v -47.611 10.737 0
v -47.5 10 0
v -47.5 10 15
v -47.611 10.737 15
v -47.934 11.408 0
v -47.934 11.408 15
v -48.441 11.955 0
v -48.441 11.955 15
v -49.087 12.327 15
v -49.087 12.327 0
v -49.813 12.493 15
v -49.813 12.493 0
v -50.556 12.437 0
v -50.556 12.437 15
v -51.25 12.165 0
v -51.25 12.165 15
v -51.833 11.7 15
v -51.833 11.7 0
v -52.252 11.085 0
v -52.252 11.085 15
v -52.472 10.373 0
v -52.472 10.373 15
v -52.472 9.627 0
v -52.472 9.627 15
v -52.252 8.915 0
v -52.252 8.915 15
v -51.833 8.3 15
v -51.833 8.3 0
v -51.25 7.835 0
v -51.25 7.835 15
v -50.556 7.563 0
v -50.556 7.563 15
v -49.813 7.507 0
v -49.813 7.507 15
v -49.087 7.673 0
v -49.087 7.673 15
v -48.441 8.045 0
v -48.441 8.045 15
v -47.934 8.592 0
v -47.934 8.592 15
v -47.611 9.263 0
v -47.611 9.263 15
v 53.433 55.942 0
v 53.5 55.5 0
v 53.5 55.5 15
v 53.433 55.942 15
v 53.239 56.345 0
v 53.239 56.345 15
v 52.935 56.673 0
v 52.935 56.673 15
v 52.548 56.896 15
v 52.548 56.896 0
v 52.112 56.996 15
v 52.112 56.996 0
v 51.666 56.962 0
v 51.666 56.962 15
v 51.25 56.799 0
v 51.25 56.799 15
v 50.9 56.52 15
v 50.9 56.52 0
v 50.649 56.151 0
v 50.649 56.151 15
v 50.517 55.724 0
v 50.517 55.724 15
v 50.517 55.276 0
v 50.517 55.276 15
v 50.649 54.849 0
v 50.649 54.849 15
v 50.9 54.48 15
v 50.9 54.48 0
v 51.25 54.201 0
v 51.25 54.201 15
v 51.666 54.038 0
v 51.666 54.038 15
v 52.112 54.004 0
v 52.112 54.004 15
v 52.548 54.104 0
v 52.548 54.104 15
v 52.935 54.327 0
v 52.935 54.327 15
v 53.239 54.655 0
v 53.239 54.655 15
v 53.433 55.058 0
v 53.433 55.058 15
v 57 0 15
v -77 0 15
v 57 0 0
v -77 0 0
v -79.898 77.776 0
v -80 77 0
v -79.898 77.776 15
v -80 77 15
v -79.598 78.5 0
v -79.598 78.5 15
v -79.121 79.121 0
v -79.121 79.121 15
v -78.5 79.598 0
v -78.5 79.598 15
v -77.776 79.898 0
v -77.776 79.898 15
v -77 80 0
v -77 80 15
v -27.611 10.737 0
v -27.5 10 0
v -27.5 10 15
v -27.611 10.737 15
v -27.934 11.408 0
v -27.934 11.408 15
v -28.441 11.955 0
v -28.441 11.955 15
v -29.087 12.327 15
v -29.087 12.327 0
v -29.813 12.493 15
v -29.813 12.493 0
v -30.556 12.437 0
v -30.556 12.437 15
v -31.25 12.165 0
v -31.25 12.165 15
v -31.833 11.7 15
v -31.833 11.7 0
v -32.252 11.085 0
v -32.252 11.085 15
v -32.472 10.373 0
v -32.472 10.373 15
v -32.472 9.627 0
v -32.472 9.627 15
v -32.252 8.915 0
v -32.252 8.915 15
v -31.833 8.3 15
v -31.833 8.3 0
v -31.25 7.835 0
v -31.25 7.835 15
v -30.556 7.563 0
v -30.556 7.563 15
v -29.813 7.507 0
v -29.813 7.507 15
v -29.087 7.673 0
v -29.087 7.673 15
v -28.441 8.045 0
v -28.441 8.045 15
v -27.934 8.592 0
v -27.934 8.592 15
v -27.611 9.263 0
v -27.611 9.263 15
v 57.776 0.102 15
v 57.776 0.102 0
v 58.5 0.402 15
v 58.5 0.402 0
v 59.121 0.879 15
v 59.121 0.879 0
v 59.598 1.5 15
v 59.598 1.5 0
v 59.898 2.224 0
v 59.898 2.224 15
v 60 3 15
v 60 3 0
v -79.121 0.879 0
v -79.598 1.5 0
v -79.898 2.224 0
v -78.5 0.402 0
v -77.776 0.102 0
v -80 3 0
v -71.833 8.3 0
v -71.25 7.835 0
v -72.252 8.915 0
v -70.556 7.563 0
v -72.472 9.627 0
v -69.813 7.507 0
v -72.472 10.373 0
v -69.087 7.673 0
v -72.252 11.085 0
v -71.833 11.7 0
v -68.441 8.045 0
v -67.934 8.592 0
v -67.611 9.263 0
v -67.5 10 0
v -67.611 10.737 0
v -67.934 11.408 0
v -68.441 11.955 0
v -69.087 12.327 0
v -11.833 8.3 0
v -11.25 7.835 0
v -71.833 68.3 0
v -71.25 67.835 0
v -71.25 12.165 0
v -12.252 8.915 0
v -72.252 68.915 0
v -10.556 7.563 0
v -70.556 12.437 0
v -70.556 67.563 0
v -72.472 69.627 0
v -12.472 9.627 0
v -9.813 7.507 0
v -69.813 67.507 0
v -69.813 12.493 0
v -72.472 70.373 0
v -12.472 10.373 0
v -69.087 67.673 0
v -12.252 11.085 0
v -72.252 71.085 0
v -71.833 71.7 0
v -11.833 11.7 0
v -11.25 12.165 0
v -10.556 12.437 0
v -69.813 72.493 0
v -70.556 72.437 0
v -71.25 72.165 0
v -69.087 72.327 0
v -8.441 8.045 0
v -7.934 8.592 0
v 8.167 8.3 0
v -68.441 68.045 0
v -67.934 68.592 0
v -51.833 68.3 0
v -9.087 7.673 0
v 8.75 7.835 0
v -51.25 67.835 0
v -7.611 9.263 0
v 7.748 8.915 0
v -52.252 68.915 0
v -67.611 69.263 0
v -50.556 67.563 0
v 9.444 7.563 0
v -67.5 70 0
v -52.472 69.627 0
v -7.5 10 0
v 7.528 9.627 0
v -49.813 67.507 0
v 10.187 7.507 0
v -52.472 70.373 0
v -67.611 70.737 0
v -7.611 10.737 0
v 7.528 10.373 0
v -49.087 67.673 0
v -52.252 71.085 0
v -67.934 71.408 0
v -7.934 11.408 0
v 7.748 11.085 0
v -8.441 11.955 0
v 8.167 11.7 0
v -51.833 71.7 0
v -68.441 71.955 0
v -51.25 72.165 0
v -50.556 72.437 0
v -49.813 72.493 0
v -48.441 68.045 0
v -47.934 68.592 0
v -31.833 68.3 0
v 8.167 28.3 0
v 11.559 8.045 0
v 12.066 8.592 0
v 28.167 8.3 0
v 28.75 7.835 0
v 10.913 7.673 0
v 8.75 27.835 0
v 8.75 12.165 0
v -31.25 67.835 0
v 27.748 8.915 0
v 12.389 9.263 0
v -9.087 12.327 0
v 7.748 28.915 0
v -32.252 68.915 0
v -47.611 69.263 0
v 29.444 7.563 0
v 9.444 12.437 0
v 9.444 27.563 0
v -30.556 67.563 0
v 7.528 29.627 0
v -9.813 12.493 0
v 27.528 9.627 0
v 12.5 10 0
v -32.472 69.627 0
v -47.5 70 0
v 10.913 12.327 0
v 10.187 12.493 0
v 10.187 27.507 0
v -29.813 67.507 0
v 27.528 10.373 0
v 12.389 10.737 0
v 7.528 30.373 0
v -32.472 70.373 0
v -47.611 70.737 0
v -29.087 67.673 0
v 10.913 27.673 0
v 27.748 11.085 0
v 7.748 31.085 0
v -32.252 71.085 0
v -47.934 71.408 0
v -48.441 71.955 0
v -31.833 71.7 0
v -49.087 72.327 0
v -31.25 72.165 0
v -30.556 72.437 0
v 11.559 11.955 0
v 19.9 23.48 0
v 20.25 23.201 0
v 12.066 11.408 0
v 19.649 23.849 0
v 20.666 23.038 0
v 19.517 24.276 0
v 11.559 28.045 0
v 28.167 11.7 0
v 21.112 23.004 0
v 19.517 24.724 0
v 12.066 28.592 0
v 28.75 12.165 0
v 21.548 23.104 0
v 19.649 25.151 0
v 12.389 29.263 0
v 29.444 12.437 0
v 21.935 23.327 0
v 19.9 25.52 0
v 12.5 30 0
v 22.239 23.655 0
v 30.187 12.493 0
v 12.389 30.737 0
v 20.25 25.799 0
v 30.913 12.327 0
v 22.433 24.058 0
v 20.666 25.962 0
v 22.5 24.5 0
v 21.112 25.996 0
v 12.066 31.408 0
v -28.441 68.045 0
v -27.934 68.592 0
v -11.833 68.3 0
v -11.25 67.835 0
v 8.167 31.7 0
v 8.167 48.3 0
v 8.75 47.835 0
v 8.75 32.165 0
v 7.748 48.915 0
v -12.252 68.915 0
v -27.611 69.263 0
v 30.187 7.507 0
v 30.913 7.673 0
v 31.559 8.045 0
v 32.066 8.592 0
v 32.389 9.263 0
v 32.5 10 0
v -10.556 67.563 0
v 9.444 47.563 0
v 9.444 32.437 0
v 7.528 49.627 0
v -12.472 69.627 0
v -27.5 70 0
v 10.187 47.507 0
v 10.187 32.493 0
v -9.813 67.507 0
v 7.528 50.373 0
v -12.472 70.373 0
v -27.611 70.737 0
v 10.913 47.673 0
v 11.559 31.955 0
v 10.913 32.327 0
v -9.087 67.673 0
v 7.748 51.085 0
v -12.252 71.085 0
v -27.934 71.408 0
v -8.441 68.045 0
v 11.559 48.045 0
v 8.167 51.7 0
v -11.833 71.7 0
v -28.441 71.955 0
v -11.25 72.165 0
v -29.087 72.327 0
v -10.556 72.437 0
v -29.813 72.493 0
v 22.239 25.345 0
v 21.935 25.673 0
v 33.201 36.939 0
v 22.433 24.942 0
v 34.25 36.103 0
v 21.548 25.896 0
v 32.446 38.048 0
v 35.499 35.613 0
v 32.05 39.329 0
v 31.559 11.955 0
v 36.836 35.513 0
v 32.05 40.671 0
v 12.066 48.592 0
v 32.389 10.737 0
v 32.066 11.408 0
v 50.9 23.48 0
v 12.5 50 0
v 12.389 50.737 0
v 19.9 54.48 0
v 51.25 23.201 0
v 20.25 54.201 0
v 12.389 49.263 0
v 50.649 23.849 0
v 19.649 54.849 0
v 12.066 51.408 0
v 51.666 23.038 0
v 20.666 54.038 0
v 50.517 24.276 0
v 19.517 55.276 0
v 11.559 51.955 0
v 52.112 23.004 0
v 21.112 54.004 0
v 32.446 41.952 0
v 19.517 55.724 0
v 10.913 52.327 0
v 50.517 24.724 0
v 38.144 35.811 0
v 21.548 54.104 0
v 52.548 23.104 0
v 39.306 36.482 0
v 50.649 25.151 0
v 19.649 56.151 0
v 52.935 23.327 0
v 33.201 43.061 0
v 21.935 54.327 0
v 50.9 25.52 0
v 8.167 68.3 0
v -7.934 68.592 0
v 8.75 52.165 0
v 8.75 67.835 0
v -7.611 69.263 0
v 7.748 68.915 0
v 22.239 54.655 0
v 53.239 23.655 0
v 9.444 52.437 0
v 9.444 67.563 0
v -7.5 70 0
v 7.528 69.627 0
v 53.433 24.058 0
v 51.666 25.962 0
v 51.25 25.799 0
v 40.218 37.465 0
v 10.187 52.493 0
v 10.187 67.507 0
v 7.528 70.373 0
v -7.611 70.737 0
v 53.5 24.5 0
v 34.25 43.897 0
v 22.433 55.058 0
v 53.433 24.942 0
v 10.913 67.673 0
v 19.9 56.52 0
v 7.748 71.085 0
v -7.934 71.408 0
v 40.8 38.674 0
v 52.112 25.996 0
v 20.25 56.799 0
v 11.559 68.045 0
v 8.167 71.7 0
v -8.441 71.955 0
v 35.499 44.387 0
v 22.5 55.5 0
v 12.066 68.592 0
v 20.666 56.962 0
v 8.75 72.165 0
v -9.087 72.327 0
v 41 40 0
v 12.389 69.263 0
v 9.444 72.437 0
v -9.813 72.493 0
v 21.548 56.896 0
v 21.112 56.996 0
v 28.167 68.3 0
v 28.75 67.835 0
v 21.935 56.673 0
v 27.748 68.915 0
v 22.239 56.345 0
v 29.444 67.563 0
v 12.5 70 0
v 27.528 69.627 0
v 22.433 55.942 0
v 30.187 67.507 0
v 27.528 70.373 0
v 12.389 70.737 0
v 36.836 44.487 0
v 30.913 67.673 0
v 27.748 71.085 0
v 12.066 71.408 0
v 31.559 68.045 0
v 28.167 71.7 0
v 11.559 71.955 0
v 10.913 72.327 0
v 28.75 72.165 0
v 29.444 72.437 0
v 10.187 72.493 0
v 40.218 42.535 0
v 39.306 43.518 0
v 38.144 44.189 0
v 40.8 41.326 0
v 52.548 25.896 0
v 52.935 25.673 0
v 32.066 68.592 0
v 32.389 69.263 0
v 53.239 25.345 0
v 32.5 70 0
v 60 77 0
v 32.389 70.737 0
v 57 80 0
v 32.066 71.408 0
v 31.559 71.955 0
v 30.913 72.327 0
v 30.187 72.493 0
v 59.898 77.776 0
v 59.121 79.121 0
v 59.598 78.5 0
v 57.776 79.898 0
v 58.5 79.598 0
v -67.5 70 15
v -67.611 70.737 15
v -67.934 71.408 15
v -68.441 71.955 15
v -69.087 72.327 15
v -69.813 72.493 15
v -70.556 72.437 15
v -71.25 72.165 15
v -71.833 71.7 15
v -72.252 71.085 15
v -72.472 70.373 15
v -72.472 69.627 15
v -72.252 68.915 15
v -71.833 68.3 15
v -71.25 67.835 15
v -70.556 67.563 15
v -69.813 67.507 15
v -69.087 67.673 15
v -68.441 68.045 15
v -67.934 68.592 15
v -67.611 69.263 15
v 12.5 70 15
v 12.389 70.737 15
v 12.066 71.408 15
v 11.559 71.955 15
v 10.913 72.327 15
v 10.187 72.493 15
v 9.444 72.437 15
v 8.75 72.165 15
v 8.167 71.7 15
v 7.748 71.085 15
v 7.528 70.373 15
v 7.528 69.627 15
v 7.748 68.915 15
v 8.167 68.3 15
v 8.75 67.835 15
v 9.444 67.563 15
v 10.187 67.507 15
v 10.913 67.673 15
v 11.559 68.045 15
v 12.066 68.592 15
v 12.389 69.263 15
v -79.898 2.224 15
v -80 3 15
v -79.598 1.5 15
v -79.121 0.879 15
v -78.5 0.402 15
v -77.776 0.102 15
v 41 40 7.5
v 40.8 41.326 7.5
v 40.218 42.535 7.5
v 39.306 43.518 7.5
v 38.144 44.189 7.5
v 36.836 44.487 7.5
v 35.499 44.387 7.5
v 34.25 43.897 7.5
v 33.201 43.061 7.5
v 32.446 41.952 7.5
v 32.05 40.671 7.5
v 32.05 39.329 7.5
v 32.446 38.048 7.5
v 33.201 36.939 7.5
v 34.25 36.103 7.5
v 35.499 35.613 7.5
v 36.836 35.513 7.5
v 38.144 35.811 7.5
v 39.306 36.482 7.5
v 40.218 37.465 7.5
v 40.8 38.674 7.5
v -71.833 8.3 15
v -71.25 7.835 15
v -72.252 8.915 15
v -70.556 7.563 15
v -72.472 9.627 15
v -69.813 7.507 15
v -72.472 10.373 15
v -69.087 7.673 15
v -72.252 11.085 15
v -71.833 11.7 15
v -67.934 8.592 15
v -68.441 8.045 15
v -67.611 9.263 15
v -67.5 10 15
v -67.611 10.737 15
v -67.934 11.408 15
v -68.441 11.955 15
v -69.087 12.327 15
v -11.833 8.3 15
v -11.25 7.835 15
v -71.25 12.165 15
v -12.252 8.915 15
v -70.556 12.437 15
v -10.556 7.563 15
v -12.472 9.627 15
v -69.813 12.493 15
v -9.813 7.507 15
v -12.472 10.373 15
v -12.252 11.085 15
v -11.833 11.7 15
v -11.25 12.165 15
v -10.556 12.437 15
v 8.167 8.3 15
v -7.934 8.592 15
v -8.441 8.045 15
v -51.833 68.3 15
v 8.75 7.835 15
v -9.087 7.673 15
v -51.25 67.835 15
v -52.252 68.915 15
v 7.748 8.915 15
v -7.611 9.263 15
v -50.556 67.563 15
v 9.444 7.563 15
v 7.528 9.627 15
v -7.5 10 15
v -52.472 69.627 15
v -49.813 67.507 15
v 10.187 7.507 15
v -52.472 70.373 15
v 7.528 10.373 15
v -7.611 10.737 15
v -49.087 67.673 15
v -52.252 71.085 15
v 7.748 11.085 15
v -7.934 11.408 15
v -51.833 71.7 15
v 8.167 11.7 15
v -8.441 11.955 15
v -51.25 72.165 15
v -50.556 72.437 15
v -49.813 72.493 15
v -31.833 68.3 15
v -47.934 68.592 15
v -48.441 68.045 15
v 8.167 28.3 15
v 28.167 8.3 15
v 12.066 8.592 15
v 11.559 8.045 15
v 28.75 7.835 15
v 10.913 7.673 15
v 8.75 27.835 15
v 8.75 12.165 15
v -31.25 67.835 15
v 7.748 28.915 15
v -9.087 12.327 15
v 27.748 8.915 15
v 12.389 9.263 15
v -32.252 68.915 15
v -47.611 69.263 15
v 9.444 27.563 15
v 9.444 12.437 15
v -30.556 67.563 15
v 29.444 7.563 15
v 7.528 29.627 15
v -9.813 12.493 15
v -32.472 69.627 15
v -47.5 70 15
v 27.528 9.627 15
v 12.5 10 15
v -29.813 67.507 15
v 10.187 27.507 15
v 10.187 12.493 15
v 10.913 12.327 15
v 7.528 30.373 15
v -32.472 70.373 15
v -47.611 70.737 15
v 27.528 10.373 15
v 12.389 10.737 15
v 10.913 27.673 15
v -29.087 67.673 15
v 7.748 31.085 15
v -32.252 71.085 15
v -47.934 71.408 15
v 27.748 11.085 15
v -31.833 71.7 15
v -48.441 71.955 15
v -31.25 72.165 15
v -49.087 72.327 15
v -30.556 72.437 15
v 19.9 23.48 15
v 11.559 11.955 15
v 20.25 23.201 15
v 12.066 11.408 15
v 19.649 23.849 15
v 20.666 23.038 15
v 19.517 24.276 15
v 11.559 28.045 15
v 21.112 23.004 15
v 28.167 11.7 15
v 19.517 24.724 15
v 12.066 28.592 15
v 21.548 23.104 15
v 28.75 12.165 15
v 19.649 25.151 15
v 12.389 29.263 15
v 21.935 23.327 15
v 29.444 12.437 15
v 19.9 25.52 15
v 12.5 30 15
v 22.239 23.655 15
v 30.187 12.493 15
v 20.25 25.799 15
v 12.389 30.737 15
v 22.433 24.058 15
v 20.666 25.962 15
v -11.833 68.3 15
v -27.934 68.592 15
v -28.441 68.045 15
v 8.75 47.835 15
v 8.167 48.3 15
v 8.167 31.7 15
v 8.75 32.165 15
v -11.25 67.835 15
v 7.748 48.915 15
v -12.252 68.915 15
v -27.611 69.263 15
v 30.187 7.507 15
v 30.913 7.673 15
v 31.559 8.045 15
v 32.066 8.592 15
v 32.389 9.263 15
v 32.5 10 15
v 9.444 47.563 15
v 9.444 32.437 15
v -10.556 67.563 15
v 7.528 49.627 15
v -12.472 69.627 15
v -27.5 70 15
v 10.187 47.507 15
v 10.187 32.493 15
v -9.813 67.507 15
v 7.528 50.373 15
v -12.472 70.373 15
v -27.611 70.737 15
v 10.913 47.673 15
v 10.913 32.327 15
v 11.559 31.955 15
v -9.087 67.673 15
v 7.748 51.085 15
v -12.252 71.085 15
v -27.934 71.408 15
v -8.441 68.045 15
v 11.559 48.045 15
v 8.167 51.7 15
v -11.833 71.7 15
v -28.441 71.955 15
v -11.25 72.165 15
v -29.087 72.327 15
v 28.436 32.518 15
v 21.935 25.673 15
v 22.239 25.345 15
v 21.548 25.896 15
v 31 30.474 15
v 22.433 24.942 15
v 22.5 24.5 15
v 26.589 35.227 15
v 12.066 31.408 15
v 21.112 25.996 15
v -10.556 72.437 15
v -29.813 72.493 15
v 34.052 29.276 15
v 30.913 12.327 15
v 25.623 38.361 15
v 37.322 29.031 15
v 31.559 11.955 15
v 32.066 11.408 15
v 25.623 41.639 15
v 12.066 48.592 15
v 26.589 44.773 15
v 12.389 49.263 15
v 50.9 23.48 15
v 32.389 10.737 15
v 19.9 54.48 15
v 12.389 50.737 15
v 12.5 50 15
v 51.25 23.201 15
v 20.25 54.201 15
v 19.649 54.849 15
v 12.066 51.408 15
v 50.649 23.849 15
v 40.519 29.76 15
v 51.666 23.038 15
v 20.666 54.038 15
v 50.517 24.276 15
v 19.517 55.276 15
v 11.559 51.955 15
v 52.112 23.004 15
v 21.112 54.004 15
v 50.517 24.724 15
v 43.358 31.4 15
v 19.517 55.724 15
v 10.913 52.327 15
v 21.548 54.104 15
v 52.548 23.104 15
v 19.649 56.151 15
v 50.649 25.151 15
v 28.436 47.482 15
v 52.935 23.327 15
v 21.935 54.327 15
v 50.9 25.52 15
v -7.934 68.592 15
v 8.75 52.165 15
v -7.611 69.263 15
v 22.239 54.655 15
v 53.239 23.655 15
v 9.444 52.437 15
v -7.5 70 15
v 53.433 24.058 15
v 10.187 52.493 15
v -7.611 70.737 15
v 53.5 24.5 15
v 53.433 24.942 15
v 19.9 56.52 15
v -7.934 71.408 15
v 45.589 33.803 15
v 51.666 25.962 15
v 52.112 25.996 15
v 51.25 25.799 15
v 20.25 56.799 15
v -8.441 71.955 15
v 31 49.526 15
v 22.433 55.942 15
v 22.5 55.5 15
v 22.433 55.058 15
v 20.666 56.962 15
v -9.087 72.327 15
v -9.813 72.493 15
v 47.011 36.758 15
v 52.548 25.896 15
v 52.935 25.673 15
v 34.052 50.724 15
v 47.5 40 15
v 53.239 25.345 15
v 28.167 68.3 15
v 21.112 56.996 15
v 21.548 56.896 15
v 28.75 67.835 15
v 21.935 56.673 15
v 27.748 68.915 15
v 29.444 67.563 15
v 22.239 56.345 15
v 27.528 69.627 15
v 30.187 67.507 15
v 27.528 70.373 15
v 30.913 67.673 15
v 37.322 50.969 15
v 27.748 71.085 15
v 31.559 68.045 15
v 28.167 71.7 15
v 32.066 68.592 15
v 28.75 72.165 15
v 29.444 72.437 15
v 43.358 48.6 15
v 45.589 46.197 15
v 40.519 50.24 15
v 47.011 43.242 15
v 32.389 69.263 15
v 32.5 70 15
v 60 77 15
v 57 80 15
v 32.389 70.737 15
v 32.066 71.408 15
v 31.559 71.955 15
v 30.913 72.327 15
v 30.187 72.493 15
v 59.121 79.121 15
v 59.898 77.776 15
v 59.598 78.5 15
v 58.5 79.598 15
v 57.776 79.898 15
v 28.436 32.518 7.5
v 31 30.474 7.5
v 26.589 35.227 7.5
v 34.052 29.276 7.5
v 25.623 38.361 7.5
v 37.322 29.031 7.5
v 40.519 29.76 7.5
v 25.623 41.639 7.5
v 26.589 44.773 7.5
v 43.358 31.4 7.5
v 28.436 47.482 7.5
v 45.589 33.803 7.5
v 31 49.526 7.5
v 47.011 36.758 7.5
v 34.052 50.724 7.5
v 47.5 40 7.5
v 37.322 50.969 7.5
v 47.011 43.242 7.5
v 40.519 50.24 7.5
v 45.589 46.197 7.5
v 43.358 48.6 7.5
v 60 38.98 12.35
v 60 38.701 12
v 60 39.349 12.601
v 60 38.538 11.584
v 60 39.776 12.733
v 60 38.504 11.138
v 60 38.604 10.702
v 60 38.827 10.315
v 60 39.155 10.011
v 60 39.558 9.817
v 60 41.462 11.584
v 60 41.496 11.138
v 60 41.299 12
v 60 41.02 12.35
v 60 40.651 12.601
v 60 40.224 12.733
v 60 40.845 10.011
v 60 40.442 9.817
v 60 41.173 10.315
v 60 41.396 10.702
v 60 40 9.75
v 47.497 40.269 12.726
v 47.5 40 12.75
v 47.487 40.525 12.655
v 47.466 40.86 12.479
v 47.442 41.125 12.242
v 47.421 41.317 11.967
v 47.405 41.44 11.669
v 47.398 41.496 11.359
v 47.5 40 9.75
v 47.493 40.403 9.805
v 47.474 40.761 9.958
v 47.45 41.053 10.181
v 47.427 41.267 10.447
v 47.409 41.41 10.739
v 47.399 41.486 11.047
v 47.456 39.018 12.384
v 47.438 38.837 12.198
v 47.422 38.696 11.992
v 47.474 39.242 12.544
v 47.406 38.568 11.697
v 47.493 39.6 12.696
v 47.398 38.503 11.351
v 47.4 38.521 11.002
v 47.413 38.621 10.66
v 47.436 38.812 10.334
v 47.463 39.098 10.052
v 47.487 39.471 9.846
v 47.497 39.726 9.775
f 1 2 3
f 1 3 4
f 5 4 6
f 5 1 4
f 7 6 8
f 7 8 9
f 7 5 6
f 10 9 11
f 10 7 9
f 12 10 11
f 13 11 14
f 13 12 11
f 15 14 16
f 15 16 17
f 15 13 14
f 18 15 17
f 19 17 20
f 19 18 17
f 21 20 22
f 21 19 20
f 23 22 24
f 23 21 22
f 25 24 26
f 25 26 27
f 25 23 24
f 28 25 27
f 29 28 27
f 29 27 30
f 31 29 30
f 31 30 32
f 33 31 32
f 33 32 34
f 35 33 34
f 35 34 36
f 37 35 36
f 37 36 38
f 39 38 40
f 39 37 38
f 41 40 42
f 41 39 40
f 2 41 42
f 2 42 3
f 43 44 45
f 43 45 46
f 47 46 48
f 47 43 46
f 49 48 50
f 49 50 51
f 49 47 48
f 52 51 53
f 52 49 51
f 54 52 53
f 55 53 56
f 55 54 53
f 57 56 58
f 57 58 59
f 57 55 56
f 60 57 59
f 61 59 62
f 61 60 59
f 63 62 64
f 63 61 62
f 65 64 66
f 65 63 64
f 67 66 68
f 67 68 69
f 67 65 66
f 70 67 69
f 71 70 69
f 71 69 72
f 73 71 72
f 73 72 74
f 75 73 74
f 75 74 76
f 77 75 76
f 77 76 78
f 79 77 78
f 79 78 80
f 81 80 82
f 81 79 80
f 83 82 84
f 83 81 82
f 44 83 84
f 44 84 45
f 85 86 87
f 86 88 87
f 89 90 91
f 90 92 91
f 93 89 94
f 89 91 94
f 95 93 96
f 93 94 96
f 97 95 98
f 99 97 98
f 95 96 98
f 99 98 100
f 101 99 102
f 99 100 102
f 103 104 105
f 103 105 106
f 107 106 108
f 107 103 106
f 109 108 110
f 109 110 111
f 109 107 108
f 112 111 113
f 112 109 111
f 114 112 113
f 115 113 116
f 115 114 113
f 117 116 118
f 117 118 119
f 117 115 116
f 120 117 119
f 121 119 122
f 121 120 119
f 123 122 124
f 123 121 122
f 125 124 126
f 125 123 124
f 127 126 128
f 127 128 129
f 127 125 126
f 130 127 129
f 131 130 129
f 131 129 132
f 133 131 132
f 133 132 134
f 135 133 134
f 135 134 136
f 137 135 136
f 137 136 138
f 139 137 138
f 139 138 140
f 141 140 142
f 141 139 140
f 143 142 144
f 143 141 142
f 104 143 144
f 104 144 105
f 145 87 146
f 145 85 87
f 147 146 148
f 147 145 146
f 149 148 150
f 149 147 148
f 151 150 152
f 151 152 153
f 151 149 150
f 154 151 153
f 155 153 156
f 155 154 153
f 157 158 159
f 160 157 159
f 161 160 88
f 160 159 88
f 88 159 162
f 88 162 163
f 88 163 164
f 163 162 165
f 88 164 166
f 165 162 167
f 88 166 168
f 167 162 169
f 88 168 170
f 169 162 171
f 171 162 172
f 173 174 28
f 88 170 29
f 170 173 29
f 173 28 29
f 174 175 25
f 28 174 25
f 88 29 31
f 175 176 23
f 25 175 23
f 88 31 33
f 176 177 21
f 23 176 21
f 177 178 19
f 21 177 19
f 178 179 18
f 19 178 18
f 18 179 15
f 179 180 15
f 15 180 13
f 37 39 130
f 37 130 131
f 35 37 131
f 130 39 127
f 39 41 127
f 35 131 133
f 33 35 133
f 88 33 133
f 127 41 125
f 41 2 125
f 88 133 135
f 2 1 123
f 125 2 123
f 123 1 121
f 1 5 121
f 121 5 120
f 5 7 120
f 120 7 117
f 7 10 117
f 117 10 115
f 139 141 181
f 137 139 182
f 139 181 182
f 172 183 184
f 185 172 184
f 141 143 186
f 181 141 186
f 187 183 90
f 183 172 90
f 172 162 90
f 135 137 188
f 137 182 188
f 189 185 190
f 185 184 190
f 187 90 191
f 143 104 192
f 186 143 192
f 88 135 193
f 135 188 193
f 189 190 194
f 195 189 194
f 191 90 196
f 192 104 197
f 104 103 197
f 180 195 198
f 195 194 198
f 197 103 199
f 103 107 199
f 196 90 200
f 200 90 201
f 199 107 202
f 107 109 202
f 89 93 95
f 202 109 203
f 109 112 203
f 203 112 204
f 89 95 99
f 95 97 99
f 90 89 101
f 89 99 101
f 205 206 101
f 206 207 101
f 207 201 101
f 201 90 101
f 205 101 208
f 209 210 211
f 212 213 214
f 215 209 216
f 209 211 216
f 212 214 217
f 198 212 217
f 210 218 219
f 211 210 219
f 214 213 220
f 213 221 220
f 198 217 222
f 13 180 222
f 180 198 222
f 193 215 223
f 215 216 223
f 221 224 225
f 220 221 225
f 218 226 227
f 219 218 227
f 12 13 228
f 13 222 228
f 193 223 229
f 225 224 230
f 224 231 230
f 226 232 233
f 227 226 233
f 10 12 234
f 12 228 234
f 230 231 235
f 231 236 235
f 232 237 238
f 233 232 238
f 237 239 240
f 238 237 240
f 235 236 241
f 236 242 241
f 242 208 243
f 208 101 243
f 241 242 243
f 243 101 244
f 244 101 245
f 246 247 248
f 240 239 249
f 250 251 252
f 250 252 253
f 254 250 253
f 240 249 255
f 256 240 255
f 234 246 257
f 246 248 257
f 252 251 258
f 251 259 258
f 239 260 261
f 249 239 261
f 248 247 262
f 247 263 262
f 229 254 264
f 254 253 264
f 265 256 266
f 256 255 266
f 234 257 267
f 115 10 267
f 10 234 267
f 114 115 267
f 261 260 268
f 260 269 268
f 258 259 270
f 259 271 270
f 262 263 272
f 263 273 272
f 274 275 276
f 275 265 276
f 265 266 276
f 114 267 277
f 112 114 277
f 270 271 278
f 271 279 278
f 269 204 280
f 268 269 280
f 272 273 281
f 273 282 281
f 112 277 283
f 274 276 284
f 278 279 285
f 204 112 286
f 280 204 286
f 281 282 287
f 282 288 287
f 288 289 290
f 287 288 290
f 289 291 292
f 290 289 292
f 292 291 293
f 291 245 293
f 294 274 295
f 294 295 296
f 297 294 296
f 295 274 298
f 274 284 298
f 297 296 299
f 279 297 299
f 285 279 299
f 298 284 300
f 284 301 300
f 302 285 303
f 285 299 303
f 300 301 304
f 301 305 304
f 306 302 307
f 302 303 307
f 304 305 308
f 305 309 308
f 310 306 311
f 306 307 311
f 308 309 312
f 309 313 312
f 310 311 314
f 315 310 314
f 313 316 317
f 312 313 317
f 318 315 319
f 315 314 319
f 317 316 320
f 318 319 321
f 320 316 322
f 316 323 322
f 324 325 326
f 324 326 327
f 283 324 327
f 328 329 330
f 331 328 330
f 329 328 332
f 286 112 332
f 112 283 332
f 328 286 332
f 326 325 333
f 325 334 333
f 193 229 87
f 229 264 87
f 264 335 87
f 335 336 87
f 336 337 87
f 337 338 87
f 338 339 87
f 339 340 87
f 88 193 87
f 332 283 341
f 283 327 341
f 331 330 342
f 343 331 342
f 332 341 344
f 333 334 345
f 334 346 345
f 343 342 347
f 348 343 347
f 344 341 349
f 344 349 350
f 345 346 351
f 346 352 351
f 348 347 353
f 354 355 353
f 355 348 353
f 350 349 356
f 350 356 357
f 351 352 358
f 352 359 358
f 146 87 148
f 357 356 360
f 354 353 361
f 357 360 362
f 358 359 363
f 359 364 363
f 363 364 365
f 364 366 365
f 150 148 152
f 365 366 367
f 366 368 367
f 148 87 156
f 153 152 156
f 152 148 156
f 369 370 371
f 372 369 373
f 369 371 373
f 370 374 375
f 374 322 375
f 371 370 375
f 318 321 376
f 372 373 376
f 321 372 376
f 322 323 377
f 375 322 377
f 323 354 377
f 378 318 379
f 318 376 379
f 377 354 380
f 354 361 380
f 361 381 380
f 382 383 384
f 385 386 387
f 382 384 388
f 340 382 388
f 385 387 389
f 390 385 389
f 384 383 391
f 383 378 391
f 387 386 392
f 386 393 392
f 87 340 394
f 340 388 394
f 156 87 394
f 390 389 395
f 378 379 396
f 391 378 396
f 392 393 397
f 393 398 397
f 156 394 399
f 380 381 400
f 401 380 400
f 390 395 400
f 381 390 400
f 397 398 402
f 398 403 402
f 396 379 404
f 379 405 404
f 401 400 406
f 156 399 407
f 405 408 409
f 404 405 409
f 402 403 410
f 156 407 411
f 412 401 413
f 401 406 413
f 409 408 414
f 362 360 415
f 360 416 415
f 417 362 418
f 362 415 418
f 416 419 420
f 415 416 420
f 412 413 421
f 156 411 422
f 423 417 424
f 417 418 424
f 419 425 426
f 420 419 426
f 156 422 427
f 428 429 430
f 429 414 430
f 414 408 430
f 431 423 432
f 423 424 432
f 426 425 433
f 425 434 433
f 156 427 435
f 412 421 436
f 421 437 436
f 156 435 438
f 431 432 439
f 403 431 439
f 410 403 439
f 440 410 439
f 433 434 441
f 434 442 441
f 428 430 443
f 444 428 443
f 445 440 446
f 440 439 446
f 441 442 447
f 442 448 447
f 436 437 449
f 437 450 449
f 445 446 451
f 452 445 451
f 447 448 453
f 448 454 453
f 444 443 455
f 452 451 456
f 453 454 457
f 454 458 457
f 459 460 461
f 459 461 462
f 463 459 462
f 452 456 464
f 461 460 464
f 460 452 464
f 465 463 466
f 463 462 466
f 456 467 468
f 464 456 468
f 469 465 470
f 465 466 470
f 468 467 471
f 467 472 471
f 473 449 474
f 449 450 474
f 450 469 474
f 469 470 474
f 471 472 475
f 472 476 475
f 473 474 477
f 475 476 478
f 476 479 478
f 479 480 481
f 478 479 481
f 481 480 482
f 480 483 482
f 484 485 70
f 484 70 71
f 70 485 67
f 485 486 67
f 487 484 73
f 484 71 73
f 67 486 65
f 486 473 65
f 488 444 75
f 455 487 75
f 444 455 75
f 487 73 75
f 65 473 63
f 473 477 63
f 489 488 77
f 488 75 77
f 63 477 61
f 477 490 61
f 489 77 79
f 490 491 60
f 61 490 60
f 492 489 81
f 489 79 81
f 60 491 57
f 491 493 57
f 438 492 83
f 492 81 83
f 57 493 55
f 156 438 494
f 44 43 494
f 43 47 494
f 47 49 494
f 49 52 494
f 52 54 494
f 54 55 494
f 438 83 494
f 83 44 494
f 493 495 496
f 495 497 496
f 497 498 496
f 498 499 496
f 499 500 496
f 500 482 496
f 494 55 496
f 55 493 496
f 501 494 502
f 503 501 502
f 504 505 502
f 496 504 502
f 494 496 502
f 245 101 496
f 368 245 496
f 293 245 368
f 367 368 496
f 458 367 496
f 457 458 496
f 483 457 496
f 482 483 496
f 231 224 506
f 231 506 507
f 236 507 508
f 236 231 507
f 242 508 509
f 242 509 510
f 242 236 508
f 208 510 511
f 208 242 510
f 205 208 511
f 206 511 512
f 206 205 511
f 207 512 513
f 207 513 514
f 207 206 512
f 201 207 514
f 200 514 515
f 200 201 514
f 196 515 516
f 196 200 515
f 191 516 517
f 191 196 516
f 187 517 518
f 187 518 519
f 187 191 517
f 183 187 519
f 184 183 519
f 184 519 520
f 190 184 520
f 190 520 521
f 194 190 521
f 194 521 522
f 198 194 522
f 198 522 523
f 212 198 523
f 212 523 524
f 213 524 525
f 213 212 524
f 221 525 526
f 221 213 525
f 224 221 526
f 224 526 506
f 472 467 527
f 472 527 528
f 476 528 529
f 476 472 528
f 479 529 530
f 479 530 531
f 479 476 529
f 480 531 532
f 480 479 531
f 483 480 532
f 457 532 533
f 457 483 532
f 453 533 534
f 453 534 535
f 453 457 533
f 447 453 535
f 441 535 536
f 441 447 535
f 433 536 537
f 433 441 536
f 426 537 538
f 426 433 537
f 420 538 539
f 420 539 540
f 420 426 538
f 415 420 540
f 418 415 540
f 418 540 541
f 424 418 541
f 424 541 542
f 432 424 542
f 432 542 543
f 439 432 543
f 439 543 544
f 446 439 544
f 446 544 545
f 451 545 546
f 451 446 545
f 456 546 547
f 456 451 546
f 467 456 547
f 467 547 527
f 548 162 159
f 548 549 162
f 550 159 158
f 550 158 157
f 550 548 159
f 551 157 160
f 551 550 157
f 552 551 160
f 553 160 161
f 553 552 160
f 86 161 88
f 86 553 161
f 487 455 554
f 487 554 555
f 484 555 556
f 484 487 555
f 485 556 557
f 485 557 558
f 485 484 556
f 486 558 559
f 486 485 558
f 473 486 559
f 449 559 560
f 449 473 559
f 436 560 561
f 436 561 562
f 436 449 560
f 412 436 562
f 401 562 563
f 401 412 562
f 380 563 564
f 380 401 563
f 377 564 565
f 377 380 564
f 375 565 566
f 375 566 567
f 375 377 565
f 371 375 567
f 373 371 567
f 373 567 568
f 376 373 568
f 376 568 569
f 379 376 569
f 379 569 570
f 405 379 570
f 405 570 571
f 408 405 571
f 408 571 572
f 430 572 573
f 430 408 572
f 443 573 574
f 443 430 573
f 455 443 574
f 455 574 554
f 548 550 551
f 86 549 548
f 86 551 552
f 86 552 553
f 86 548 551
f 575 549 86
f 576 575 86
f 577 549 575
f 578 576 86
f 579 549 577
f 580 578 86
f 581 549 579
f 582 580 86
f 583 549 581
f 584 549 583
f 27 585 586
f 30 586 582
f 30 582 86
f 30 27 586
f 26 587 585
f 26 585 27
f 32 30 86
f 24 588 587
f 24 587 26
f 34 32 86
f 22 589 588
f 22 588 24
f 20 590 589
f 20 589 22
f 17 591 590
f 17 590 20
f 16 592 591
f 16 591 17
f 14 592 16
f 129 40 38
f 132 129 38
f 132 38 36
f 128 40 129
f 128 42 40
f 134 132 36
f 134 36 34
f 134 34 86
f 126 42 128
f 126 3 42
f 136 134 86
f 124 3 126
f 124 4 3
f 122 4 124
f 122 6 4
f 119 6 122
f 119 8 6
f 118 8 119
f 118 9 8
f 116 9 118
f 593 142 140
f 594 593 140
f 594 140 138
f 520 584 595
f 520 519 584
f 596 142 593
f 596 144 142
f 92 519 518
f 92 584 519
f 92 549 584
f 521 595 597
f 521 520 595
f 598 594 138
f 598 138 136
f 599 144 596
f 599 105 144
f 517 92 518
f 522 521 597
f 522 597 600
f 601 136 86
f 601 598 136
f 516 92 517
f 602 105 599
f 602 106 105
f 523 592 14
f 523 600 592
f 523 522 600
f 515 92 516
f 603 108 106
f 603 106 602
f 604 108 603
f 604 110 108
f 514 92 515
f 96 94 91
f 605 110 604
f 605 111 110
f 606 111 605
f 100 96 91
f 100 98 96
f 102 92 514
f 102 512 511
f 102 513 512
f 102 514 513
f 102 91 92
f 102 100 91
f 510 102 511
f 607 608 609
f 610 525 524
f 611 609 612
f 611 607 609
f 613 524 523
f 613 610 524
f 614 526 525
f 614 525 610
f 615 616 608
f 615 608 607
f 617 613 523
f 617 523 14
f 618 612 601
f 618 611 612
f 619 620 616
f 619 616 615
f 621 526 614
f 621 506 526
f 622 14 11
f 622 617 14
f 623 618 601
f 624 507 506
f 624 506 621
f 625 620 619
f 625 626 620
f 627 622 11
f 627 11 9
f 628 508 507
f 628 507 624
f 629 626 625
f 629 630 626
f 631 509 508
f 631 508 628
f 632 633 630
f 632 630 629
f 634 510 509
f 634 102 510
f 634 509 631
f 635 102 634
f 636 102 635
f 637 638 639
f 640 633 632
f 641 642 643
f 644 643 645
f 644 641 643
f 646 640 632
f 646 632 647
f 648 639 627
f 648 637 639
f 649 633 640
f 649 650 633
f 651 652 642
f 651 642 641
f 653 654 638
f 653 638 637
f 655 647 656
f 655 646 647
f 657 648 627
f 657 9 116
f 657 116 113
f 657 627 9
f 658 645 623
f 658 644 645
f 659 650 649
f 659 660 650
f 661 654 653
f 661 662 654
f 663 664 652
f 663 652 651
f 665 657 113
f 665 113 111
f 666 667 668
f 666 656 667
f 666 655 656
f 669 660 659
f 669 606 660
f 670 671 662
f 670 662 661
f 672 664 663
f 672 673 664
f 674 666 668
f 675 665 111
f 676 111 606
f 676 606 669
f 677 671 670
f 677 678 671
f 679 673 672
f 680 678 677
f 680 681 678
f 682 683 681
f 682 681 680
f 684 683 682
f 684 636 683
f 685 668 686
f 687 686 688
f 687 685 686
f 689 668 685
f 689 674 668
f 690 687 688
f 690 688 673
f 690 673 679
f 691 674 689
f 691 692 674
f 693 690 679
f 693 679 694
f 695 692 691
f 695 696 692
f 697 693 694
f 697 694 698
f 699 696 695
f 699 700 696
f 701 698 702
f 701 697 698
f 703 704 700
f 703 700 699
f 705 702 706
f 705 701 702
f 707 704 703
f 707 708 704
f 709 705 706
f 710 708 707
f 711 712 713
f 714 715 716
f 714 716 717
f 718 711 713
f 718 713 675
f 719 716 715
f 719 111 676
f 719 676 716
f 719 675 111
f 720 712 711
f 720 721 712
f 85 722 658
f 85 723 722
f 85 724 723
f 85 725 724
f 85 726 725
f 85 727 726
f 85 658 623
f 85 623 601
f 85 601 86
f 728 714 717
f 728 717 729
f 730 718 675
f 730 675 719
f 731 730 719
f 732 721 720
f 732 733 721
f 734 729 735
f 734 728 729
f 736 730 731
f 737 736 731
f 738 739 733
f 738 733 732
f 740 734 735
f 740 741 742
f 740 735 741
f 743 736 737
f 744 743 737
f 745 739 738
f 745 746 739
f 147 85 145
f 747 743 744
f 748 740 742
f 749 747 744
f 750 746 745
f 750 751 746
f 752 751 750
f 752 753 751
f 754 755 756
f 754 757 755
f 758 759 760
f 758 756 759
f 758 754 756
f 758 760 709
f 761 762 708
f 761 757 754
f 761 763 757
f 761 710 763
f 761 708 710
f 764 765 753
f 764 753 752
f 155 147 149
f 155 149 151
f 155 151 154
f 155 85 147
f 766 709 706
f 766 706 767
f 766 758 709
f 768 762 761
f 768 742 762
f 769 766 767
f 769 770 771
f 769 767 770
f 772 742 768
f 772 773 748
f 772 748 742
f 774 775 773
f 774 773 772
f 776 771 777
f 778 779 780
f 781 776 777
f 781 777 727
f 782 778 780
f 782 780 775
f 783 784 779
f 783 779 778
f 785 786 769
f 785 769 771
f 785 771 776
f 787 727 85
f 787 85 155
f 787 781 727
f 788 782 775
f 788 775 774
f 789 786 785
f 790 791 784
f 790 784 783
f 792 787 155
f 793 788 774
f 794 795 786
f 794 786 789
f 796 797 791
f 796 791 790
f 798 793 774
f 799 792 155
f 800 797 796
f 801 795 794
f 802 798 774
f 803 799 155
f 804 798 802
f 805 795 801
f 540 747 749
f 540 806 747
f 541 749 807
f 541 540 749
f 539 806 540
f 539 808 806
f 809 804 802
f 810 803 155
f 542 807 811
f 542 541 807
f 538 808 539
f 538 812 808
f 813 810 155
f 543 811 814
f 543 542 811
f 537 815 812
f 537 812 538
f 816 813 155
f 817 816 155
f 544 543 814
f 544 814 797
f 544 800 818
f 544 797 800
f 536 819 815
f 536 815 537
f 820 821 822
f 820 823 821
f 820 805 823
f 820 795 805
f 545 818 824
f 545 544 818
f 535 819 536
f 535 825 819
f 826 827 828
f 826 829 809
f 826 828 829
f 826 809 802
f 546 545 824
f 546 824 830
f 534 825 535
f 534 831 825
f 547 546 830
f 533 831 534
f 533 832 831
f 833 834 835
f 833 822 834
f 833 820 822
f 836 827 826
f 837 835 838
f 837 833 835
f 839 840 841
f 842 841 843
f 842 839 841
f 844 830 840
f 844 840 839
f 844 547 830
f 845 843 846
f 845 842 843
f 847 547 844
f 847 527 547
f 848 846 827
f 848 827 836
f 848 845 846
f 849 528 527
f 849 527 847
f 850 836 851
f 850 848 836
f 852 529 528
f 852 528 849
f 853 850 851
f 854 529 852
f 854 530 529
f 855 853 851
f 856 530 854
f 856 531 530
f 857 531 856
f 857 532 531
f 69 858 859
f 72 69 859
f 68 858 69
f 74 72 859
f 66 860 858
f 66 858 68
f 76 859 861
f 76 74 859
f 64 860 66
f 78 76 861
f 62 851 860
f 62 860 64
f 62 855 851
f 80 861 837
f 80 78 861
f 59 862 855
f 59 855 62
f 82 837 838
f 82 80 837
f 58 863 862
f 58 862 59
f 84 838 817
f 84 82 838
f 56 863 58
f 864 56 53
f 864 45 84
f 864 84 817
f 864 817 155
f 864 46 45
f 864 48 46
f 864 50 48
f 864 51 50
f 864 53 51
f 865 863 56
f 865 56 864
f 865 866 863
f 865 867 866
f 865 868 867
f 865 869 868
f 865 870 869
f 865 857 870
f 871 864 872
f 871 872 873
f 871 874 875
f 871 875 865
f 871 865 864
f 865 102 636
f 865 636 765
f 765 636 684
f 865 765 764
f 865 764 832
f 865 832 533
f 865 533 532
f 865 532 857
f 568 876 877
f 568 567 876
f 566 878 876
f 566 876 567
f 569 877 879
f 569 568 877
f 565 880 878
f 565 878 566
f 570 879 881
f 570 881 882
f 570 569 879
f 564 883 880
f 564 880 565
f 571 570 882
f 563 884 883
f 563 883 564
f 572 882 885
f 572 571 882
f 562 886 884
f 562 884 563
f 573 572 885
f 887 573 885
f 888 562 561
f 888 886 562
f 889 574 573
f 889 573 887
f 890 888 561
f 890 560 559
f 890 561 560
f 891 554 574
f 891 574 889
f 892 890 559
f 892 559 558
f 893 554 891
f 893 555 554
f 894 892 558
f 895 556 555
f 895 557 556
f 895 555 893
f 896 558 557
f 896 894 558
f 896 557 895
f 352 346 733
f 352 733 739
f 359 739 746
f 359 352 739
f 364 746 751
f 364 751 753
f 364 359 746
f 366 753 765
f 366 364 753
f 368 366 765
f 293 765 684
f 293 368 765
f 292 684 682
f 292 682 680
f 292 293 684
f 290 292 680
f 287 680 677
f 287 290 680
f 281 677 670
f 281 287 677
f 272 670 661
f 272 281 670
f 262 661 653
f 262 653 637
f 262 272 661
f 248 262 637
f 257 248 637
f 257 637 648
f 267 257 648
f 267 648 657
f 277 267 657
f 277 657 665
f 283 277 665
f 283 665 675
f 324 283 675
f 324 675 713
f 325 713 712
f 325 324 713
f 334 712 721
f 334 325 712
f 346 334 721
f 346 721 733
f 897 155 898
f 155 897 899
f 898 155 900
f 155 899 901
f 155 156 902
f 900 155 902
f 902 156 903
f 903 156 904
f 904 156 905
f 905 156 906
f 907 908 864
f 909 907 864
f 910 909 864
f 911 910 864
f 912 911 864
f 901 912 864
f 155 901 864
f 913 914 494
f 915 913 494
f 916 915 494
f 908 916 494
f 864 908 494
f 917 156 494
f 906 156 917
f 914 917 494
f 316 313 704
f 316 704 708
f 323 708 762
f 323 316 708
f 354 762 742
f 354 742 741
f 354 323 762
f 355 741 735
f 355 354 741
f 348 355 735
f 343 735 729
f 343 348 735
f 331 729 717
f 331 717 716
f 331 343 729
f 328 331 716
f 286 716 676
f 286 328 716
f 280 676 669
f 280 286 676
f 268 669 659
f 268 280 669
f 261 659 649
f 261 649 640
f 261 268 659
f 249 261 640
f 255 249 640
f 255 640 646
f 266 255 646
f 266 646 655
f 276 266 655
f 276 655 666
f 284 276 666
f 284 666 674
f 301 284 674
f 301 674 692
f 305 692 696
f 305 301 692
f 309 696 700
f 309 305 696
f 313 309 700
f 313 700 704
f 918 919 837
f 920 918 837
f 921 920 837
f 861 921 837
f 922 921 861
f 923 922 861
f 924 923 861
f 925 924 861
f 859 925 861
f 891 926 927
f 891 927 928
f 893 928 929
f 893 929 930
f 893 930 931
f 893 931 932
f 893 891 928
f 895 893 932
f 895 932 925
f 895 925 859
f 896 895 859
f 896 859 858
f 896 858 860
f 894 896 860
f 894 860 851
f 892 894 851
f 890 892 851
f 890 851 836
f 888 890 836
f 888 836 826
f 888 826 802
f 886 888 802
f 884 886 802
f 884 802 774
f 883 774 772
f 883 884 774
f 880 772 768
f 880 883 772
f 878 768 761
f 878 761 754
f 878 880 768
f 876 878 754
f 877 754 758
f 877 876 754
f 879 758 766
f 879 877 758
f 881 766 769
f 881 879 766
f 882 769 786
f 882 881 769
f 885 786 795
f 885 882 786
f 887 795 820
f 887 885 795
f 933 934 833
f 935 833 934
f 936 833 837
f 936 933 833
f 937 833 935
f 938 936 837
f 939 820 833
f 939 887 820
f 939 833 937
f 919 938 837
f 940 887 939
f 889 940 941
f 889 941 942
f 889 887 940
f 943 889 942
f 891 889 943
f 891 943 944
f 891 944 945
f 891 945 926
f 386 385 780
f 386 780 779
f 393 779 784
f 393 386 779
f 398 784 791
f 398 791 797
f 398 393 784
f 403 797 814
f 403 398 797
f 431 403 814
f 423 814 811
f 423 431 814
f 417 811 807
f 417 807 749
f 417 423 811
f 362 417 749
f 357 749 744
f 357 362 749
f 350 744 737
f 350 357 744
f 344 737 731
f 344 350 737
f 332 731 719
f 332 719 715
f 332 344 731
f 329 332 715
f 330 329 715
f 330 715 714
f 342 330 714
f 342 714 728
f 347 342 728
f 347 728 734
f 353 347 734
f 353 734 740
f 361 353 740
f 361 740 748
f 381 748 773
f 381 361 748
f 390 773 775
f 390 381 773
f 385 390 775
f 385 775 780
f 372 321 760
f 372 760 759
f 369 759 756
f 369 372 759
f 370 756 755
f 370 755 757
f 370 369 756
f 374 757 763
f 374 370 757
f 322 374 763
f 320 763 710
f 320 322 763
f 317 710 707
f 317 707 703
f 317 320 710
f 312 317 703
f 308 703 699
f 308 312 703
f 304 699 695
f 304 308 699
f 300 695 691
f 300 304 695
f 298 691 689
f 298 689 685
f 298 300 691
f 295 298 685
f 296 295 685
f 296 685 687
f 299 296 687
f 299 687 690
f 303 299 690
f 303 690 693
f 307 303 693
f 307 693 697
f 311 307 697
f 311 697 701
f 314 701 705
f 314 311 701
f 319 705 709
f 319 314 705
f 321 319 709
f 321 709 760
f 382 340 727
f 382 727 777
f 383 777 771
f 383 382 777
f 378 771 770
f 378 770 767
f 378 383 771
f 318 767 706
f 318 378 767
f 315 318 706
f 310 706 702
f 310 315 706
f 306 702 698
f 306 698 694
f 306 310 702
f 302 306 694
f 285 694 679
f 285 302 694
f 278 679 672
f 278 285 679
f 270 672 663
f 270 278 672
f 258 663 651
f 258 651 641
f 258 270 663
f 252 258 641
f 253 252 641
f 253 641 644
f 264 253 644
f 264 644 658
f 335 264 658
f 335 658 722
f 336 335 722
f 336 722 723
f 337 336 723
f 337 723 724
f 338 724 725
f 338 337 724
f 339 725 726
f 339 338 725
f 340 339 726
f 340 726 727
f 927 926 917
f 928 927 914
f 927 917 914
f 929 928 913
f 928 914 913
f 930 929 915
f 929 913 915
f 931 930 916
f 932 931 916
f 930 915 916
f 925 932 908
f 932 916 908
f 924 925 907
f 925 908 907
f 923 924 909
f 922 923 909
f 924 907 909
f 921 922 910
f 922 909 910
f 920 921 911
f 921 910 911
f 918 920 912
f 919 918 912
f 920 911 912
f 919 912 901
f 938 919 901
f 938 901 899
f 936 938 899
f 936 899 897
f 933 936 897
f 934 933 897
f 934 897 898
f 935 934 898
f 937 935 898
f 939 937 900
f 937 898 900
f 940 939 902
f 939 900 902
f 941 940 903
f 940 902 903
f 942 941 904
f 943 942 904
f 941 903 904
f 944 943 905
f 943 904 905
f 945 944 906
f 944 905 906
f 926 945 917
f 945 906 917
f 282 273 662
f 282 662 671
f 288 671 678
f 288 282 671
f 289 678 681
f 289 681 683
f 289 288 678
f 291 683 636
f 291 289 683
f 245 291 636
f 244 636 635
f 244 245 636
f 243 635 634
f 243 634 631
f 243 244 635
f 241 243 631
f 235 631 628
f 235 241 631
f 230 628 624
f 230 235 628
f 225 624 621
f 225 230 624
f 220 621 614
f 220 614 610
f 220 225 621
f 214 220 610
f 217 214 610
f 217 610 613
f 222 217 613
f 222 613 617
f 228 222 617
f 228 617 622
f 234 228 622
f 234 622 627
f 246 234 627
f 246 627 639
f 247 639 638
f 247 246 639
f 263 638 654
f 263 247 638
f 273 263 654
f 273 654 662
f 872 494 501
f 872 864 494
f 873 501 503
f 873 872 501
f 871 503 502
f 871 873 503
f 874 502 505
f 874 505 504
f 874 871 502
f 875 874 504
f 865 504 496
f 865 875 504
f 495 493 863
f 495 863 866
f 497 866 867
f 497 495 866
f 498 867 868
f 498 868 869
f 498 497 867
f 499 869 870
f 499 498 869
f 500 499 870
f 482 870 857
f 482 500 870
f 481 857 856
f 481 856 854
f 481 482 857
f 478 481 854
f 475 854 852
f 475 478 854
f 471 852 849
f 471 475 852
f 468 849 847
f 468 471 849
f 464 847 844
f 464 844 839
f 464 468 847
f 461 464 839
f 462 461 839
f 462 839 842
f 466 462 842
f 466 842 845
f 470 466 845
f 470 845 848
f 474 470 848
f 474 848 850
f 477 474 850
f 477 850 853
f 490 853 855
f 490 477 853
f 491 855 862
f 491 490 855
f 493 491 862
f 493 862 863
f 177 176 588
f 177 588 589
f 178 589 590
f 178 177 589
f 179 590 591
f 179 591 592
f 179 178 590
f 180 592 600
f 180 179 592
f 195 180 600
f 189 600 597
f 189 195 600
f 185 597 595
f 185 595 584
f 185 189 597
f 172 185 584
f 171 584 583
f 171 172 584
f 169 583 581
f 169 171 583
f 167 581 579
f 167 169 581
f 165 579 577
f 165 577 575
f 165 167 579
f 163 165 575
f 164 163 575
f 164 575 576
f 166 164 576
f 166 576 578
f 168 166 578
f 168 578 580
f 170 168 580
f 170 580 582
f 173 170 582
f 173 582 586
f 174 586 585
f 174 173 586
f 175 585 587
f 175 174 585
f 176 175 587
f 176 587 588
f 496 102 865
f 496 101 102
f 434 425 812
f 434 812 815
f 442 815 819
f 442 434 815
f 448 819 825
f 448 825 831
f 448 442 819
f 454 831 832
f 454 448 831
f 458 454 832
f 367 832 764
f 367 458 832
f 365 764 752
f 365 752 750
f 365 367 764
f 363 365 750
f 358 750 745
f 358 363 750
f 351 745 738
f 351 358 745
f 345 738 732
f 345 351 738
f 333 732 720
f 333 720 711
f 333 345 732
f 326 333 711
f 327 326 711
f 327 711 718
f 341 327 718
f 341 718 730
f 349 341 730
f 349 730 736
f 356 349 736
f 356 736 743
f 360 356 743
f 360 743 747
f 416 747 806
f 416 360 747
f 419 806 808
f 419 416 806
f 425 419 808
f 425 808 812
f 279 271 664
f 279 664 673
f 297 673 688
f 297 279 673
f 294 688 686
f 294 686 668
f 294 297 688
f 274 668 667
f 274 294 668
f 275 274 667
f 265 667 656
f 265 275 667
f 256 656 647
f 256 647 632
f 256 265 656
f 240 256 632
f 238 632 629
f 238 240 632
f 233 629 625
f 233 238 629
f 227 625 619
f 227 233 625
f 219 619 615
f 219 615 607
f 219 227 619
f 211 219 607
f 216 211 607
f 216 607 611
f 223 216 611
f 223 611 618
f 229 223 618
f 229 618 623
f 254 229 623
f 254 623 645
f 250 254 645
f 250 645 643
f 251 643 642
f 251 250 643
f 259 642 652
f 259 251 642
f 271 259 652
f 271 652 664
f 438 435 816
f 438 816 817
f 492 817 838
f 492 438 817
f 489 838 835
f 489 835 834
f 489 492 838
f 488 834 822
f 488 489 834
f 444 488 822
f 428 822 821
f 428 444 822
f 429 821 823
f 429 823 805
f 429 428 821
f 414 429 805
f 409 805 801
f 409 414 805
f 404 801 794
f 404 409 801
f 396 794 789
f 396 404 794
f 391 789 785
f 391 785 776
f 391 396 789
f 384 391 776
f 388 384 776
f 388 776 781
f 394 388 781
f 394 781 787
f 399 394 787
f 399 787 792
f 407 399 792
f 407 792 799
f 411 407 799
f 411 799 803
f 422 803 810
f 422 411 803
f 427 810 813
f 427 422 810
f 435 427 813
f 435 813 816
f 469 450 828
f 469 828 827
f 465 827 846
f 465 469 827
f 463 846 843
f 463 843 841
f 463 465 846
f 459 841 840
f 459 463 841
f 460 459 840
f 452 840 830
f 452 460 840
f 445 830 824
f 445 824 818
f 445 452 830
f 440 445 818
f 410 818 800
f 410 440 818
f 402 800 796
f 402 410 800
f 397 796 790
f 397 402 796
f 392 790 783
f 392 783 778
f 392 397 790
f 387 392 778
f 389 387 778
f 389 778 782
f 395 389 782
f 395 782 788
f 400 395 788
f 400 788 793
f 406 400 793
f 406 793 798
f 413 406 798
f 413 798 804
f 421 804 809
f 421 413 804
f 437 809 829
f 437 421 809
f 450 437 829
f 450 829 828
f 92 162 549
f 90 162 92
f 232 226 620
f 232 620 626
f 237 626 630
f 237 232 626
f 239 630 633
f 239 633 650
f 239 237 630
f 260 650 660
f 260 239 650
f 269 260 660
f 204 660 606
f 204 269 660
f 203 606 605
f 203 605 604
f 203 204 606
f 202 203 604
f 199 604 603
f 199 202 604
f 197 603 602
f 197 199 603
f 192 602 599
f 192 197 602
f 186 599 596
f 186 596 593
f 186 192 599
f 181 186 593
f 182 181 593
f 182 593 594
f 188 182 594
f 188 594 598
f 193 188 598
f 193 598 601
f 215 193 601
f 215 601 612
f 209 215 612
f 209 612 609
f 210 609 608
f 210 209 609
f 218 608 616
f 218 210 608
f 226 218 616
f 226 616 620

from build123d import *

# Parameters (mm, degrees)
SKETCH1_W               = 60
SKETCH1_H               = 80
SKETCH1_R               = 1.5
SKETCH1_R_2             = 11
SKETCH1_R_3             = 2.5
SKETCH1_W_2             = 80
BOSS_EXTRUDE1_DEPTH     = 15
SKETCH1_3_R             = 11
SKETCH1_3_R_2           = 4.5
BOSS_EXTRUDE2_DEPTH     = 7.5
FILLET1_R               = 3
CUT_EXTRUDE1_REACH      = 163.941
CUT_EXTRUDE1_END_RADIUS = 11
SKETCH2_R               = 1.5


with BuildPart() as part:
    # Sketch1 → Boss-Extrude1 (new body)
    # profile 1 of 2: a face of its own
    with BuildSketch(Plane.XY):
        with Locations((30, 40)):
            Rectangle(SKETCH1_W, SKETCH1_H)
        with Locations((21, 24.5)):
            Circle(SKETCH1_R, mode=Mode.SUBTRACT)
        with Locations((52, 24.5)):
            Circle(SKETCH1_R, mode=Mode.SUBTRACT)
        with Locations((52, 55.5)):
            Circle(SKETCH1_R, mode=Mode.SUBTRACT)
        with Locations((21, 55.5)):
            Circle(SKETCH1_R, mode=Mode.SUBTRACT)
        with Locations((36.5, 40)):
            Circle(SKETCH1_R_2, mode=Mode.SUBTRACT)
        with Locations((30, 10)):
            Circle(SKETCH1_R_3, mode=Mode.SUBTRACT)
        with Locations((30, 70)):
            Circle(SKETCH1_R_3, mode=Mode.SUBTRACT)
        with Locations((10, 70)):
            Circle(SKETCH1_R_3, mode=Mode.SUBTRACT)
        with Locations((10, 50)):
            Circle(SKETCH1_R_3, mode=Mode.SUBTRACT)
        with Locations((10, 30)):
            Circle(SKETCH1_R_3, mode=Mode.SUBTRACT)
        with Locations((10, 10)):
            Circle(SKETCH1_R_3, mode=Mode.SUBTRACT)
    # profile 2 of 2: a face of its own
    with BuildSketch(Plane.XY):
        with Locations((-40, 40)):
            Rectangle(SKETCH1_W_2, SKETCH1_H)
        with Locations((-10, 10)):
            Circle(SKETCH1_R_3, mode=Mode.SUBTRACT)
        with Locations((-30, 10)):
            Circle(SKETCH1_R_3, mode=Mode.SUBTRACT)
        with Locations((-50, 10)):
            Circle(SKETCH1_R_3, mode=Mode.SUBTRACT)
        with Locations((-70, 10)):
            Circle(SKETCH1_R_3, mode=Mode.SUBTRACT)
        with Locations((-10, 70)):
            Circle(SKETCH1_R_3, mode=Mode.SUBTRACT)
        with Locations((-30, 70)):
            Circle(SKETCH1_R_3, mode=Mode.SUBTRACT)
        with Locations((-50, 70)):
            Circle(SKETCH1_R_3, mode=Mode.SUBTRACT)
        with Locations((-70, 70)):
            Circle(SKETCH1_R_3, mode=Mode.SUBTRACT)
    extrude(amount=BOSS_EXTRUDE1_DEPTH)

    # Sketch1<3> → Boss-Extrude2 (add)
    with BuildSketch(Plane.XY):
        with Locations((36.5, 40)):
            Circle(SKETCH1_3_R)
        with Locations((36.5, 40)):
            Circle(SKETCH1_3_R_2, mode=Mode.SUBTRACT)
    extrude(amount=BOSS_EXTRUDE2_DEPTH)

    # Fillet1
    fillet1_edges = [part.edges().sort_by_distance(p)[0] for p in [
        (-80, 0, 7.5),
        (-80, 80, 7.5),
        (60, 80, 7.5),
        (60, 0, 7.5),
    ]]
    fillet(fillet1_edges, radius=FILLET1_R)

    # Cut-Extrude1: up to this cylinder (the profile starts outside it)
    cut_extrude1_end = Plane(origin=(36.5, 40, 11.25), z_dir=(0, 0, -1)) * Cylinder(CUT_EXTRUDE1_END_RADIUS, 350.882, mode=Mode.PRIVATE)
    # Sketch2 → Cut-Extrude1 (cut, up to the surface)
    with BuildSketch(Plane(origin=(60, 0, 0), x_dir=(0, 0, -1), z_dir=(1, 0, 0)), mode=Mode.PRIVATE) as cut_extrude1_sk1:
        with Locations((-11.25, 40)):
            Circle(SKETCH2_R)
    cut_extrude1_tool1 = extrude(cut_extrude1_sk1.sketch, amount=-CUT_EXTRUDE1_REACH, mode=Mode.PRIVATE) - cut_extrude1_end
    add(cut_extrude1_tool1.solids().sort_by_distance((60, 40, 11.25))[0], mode=Mode.SUBTRACT)


solid = part.part
